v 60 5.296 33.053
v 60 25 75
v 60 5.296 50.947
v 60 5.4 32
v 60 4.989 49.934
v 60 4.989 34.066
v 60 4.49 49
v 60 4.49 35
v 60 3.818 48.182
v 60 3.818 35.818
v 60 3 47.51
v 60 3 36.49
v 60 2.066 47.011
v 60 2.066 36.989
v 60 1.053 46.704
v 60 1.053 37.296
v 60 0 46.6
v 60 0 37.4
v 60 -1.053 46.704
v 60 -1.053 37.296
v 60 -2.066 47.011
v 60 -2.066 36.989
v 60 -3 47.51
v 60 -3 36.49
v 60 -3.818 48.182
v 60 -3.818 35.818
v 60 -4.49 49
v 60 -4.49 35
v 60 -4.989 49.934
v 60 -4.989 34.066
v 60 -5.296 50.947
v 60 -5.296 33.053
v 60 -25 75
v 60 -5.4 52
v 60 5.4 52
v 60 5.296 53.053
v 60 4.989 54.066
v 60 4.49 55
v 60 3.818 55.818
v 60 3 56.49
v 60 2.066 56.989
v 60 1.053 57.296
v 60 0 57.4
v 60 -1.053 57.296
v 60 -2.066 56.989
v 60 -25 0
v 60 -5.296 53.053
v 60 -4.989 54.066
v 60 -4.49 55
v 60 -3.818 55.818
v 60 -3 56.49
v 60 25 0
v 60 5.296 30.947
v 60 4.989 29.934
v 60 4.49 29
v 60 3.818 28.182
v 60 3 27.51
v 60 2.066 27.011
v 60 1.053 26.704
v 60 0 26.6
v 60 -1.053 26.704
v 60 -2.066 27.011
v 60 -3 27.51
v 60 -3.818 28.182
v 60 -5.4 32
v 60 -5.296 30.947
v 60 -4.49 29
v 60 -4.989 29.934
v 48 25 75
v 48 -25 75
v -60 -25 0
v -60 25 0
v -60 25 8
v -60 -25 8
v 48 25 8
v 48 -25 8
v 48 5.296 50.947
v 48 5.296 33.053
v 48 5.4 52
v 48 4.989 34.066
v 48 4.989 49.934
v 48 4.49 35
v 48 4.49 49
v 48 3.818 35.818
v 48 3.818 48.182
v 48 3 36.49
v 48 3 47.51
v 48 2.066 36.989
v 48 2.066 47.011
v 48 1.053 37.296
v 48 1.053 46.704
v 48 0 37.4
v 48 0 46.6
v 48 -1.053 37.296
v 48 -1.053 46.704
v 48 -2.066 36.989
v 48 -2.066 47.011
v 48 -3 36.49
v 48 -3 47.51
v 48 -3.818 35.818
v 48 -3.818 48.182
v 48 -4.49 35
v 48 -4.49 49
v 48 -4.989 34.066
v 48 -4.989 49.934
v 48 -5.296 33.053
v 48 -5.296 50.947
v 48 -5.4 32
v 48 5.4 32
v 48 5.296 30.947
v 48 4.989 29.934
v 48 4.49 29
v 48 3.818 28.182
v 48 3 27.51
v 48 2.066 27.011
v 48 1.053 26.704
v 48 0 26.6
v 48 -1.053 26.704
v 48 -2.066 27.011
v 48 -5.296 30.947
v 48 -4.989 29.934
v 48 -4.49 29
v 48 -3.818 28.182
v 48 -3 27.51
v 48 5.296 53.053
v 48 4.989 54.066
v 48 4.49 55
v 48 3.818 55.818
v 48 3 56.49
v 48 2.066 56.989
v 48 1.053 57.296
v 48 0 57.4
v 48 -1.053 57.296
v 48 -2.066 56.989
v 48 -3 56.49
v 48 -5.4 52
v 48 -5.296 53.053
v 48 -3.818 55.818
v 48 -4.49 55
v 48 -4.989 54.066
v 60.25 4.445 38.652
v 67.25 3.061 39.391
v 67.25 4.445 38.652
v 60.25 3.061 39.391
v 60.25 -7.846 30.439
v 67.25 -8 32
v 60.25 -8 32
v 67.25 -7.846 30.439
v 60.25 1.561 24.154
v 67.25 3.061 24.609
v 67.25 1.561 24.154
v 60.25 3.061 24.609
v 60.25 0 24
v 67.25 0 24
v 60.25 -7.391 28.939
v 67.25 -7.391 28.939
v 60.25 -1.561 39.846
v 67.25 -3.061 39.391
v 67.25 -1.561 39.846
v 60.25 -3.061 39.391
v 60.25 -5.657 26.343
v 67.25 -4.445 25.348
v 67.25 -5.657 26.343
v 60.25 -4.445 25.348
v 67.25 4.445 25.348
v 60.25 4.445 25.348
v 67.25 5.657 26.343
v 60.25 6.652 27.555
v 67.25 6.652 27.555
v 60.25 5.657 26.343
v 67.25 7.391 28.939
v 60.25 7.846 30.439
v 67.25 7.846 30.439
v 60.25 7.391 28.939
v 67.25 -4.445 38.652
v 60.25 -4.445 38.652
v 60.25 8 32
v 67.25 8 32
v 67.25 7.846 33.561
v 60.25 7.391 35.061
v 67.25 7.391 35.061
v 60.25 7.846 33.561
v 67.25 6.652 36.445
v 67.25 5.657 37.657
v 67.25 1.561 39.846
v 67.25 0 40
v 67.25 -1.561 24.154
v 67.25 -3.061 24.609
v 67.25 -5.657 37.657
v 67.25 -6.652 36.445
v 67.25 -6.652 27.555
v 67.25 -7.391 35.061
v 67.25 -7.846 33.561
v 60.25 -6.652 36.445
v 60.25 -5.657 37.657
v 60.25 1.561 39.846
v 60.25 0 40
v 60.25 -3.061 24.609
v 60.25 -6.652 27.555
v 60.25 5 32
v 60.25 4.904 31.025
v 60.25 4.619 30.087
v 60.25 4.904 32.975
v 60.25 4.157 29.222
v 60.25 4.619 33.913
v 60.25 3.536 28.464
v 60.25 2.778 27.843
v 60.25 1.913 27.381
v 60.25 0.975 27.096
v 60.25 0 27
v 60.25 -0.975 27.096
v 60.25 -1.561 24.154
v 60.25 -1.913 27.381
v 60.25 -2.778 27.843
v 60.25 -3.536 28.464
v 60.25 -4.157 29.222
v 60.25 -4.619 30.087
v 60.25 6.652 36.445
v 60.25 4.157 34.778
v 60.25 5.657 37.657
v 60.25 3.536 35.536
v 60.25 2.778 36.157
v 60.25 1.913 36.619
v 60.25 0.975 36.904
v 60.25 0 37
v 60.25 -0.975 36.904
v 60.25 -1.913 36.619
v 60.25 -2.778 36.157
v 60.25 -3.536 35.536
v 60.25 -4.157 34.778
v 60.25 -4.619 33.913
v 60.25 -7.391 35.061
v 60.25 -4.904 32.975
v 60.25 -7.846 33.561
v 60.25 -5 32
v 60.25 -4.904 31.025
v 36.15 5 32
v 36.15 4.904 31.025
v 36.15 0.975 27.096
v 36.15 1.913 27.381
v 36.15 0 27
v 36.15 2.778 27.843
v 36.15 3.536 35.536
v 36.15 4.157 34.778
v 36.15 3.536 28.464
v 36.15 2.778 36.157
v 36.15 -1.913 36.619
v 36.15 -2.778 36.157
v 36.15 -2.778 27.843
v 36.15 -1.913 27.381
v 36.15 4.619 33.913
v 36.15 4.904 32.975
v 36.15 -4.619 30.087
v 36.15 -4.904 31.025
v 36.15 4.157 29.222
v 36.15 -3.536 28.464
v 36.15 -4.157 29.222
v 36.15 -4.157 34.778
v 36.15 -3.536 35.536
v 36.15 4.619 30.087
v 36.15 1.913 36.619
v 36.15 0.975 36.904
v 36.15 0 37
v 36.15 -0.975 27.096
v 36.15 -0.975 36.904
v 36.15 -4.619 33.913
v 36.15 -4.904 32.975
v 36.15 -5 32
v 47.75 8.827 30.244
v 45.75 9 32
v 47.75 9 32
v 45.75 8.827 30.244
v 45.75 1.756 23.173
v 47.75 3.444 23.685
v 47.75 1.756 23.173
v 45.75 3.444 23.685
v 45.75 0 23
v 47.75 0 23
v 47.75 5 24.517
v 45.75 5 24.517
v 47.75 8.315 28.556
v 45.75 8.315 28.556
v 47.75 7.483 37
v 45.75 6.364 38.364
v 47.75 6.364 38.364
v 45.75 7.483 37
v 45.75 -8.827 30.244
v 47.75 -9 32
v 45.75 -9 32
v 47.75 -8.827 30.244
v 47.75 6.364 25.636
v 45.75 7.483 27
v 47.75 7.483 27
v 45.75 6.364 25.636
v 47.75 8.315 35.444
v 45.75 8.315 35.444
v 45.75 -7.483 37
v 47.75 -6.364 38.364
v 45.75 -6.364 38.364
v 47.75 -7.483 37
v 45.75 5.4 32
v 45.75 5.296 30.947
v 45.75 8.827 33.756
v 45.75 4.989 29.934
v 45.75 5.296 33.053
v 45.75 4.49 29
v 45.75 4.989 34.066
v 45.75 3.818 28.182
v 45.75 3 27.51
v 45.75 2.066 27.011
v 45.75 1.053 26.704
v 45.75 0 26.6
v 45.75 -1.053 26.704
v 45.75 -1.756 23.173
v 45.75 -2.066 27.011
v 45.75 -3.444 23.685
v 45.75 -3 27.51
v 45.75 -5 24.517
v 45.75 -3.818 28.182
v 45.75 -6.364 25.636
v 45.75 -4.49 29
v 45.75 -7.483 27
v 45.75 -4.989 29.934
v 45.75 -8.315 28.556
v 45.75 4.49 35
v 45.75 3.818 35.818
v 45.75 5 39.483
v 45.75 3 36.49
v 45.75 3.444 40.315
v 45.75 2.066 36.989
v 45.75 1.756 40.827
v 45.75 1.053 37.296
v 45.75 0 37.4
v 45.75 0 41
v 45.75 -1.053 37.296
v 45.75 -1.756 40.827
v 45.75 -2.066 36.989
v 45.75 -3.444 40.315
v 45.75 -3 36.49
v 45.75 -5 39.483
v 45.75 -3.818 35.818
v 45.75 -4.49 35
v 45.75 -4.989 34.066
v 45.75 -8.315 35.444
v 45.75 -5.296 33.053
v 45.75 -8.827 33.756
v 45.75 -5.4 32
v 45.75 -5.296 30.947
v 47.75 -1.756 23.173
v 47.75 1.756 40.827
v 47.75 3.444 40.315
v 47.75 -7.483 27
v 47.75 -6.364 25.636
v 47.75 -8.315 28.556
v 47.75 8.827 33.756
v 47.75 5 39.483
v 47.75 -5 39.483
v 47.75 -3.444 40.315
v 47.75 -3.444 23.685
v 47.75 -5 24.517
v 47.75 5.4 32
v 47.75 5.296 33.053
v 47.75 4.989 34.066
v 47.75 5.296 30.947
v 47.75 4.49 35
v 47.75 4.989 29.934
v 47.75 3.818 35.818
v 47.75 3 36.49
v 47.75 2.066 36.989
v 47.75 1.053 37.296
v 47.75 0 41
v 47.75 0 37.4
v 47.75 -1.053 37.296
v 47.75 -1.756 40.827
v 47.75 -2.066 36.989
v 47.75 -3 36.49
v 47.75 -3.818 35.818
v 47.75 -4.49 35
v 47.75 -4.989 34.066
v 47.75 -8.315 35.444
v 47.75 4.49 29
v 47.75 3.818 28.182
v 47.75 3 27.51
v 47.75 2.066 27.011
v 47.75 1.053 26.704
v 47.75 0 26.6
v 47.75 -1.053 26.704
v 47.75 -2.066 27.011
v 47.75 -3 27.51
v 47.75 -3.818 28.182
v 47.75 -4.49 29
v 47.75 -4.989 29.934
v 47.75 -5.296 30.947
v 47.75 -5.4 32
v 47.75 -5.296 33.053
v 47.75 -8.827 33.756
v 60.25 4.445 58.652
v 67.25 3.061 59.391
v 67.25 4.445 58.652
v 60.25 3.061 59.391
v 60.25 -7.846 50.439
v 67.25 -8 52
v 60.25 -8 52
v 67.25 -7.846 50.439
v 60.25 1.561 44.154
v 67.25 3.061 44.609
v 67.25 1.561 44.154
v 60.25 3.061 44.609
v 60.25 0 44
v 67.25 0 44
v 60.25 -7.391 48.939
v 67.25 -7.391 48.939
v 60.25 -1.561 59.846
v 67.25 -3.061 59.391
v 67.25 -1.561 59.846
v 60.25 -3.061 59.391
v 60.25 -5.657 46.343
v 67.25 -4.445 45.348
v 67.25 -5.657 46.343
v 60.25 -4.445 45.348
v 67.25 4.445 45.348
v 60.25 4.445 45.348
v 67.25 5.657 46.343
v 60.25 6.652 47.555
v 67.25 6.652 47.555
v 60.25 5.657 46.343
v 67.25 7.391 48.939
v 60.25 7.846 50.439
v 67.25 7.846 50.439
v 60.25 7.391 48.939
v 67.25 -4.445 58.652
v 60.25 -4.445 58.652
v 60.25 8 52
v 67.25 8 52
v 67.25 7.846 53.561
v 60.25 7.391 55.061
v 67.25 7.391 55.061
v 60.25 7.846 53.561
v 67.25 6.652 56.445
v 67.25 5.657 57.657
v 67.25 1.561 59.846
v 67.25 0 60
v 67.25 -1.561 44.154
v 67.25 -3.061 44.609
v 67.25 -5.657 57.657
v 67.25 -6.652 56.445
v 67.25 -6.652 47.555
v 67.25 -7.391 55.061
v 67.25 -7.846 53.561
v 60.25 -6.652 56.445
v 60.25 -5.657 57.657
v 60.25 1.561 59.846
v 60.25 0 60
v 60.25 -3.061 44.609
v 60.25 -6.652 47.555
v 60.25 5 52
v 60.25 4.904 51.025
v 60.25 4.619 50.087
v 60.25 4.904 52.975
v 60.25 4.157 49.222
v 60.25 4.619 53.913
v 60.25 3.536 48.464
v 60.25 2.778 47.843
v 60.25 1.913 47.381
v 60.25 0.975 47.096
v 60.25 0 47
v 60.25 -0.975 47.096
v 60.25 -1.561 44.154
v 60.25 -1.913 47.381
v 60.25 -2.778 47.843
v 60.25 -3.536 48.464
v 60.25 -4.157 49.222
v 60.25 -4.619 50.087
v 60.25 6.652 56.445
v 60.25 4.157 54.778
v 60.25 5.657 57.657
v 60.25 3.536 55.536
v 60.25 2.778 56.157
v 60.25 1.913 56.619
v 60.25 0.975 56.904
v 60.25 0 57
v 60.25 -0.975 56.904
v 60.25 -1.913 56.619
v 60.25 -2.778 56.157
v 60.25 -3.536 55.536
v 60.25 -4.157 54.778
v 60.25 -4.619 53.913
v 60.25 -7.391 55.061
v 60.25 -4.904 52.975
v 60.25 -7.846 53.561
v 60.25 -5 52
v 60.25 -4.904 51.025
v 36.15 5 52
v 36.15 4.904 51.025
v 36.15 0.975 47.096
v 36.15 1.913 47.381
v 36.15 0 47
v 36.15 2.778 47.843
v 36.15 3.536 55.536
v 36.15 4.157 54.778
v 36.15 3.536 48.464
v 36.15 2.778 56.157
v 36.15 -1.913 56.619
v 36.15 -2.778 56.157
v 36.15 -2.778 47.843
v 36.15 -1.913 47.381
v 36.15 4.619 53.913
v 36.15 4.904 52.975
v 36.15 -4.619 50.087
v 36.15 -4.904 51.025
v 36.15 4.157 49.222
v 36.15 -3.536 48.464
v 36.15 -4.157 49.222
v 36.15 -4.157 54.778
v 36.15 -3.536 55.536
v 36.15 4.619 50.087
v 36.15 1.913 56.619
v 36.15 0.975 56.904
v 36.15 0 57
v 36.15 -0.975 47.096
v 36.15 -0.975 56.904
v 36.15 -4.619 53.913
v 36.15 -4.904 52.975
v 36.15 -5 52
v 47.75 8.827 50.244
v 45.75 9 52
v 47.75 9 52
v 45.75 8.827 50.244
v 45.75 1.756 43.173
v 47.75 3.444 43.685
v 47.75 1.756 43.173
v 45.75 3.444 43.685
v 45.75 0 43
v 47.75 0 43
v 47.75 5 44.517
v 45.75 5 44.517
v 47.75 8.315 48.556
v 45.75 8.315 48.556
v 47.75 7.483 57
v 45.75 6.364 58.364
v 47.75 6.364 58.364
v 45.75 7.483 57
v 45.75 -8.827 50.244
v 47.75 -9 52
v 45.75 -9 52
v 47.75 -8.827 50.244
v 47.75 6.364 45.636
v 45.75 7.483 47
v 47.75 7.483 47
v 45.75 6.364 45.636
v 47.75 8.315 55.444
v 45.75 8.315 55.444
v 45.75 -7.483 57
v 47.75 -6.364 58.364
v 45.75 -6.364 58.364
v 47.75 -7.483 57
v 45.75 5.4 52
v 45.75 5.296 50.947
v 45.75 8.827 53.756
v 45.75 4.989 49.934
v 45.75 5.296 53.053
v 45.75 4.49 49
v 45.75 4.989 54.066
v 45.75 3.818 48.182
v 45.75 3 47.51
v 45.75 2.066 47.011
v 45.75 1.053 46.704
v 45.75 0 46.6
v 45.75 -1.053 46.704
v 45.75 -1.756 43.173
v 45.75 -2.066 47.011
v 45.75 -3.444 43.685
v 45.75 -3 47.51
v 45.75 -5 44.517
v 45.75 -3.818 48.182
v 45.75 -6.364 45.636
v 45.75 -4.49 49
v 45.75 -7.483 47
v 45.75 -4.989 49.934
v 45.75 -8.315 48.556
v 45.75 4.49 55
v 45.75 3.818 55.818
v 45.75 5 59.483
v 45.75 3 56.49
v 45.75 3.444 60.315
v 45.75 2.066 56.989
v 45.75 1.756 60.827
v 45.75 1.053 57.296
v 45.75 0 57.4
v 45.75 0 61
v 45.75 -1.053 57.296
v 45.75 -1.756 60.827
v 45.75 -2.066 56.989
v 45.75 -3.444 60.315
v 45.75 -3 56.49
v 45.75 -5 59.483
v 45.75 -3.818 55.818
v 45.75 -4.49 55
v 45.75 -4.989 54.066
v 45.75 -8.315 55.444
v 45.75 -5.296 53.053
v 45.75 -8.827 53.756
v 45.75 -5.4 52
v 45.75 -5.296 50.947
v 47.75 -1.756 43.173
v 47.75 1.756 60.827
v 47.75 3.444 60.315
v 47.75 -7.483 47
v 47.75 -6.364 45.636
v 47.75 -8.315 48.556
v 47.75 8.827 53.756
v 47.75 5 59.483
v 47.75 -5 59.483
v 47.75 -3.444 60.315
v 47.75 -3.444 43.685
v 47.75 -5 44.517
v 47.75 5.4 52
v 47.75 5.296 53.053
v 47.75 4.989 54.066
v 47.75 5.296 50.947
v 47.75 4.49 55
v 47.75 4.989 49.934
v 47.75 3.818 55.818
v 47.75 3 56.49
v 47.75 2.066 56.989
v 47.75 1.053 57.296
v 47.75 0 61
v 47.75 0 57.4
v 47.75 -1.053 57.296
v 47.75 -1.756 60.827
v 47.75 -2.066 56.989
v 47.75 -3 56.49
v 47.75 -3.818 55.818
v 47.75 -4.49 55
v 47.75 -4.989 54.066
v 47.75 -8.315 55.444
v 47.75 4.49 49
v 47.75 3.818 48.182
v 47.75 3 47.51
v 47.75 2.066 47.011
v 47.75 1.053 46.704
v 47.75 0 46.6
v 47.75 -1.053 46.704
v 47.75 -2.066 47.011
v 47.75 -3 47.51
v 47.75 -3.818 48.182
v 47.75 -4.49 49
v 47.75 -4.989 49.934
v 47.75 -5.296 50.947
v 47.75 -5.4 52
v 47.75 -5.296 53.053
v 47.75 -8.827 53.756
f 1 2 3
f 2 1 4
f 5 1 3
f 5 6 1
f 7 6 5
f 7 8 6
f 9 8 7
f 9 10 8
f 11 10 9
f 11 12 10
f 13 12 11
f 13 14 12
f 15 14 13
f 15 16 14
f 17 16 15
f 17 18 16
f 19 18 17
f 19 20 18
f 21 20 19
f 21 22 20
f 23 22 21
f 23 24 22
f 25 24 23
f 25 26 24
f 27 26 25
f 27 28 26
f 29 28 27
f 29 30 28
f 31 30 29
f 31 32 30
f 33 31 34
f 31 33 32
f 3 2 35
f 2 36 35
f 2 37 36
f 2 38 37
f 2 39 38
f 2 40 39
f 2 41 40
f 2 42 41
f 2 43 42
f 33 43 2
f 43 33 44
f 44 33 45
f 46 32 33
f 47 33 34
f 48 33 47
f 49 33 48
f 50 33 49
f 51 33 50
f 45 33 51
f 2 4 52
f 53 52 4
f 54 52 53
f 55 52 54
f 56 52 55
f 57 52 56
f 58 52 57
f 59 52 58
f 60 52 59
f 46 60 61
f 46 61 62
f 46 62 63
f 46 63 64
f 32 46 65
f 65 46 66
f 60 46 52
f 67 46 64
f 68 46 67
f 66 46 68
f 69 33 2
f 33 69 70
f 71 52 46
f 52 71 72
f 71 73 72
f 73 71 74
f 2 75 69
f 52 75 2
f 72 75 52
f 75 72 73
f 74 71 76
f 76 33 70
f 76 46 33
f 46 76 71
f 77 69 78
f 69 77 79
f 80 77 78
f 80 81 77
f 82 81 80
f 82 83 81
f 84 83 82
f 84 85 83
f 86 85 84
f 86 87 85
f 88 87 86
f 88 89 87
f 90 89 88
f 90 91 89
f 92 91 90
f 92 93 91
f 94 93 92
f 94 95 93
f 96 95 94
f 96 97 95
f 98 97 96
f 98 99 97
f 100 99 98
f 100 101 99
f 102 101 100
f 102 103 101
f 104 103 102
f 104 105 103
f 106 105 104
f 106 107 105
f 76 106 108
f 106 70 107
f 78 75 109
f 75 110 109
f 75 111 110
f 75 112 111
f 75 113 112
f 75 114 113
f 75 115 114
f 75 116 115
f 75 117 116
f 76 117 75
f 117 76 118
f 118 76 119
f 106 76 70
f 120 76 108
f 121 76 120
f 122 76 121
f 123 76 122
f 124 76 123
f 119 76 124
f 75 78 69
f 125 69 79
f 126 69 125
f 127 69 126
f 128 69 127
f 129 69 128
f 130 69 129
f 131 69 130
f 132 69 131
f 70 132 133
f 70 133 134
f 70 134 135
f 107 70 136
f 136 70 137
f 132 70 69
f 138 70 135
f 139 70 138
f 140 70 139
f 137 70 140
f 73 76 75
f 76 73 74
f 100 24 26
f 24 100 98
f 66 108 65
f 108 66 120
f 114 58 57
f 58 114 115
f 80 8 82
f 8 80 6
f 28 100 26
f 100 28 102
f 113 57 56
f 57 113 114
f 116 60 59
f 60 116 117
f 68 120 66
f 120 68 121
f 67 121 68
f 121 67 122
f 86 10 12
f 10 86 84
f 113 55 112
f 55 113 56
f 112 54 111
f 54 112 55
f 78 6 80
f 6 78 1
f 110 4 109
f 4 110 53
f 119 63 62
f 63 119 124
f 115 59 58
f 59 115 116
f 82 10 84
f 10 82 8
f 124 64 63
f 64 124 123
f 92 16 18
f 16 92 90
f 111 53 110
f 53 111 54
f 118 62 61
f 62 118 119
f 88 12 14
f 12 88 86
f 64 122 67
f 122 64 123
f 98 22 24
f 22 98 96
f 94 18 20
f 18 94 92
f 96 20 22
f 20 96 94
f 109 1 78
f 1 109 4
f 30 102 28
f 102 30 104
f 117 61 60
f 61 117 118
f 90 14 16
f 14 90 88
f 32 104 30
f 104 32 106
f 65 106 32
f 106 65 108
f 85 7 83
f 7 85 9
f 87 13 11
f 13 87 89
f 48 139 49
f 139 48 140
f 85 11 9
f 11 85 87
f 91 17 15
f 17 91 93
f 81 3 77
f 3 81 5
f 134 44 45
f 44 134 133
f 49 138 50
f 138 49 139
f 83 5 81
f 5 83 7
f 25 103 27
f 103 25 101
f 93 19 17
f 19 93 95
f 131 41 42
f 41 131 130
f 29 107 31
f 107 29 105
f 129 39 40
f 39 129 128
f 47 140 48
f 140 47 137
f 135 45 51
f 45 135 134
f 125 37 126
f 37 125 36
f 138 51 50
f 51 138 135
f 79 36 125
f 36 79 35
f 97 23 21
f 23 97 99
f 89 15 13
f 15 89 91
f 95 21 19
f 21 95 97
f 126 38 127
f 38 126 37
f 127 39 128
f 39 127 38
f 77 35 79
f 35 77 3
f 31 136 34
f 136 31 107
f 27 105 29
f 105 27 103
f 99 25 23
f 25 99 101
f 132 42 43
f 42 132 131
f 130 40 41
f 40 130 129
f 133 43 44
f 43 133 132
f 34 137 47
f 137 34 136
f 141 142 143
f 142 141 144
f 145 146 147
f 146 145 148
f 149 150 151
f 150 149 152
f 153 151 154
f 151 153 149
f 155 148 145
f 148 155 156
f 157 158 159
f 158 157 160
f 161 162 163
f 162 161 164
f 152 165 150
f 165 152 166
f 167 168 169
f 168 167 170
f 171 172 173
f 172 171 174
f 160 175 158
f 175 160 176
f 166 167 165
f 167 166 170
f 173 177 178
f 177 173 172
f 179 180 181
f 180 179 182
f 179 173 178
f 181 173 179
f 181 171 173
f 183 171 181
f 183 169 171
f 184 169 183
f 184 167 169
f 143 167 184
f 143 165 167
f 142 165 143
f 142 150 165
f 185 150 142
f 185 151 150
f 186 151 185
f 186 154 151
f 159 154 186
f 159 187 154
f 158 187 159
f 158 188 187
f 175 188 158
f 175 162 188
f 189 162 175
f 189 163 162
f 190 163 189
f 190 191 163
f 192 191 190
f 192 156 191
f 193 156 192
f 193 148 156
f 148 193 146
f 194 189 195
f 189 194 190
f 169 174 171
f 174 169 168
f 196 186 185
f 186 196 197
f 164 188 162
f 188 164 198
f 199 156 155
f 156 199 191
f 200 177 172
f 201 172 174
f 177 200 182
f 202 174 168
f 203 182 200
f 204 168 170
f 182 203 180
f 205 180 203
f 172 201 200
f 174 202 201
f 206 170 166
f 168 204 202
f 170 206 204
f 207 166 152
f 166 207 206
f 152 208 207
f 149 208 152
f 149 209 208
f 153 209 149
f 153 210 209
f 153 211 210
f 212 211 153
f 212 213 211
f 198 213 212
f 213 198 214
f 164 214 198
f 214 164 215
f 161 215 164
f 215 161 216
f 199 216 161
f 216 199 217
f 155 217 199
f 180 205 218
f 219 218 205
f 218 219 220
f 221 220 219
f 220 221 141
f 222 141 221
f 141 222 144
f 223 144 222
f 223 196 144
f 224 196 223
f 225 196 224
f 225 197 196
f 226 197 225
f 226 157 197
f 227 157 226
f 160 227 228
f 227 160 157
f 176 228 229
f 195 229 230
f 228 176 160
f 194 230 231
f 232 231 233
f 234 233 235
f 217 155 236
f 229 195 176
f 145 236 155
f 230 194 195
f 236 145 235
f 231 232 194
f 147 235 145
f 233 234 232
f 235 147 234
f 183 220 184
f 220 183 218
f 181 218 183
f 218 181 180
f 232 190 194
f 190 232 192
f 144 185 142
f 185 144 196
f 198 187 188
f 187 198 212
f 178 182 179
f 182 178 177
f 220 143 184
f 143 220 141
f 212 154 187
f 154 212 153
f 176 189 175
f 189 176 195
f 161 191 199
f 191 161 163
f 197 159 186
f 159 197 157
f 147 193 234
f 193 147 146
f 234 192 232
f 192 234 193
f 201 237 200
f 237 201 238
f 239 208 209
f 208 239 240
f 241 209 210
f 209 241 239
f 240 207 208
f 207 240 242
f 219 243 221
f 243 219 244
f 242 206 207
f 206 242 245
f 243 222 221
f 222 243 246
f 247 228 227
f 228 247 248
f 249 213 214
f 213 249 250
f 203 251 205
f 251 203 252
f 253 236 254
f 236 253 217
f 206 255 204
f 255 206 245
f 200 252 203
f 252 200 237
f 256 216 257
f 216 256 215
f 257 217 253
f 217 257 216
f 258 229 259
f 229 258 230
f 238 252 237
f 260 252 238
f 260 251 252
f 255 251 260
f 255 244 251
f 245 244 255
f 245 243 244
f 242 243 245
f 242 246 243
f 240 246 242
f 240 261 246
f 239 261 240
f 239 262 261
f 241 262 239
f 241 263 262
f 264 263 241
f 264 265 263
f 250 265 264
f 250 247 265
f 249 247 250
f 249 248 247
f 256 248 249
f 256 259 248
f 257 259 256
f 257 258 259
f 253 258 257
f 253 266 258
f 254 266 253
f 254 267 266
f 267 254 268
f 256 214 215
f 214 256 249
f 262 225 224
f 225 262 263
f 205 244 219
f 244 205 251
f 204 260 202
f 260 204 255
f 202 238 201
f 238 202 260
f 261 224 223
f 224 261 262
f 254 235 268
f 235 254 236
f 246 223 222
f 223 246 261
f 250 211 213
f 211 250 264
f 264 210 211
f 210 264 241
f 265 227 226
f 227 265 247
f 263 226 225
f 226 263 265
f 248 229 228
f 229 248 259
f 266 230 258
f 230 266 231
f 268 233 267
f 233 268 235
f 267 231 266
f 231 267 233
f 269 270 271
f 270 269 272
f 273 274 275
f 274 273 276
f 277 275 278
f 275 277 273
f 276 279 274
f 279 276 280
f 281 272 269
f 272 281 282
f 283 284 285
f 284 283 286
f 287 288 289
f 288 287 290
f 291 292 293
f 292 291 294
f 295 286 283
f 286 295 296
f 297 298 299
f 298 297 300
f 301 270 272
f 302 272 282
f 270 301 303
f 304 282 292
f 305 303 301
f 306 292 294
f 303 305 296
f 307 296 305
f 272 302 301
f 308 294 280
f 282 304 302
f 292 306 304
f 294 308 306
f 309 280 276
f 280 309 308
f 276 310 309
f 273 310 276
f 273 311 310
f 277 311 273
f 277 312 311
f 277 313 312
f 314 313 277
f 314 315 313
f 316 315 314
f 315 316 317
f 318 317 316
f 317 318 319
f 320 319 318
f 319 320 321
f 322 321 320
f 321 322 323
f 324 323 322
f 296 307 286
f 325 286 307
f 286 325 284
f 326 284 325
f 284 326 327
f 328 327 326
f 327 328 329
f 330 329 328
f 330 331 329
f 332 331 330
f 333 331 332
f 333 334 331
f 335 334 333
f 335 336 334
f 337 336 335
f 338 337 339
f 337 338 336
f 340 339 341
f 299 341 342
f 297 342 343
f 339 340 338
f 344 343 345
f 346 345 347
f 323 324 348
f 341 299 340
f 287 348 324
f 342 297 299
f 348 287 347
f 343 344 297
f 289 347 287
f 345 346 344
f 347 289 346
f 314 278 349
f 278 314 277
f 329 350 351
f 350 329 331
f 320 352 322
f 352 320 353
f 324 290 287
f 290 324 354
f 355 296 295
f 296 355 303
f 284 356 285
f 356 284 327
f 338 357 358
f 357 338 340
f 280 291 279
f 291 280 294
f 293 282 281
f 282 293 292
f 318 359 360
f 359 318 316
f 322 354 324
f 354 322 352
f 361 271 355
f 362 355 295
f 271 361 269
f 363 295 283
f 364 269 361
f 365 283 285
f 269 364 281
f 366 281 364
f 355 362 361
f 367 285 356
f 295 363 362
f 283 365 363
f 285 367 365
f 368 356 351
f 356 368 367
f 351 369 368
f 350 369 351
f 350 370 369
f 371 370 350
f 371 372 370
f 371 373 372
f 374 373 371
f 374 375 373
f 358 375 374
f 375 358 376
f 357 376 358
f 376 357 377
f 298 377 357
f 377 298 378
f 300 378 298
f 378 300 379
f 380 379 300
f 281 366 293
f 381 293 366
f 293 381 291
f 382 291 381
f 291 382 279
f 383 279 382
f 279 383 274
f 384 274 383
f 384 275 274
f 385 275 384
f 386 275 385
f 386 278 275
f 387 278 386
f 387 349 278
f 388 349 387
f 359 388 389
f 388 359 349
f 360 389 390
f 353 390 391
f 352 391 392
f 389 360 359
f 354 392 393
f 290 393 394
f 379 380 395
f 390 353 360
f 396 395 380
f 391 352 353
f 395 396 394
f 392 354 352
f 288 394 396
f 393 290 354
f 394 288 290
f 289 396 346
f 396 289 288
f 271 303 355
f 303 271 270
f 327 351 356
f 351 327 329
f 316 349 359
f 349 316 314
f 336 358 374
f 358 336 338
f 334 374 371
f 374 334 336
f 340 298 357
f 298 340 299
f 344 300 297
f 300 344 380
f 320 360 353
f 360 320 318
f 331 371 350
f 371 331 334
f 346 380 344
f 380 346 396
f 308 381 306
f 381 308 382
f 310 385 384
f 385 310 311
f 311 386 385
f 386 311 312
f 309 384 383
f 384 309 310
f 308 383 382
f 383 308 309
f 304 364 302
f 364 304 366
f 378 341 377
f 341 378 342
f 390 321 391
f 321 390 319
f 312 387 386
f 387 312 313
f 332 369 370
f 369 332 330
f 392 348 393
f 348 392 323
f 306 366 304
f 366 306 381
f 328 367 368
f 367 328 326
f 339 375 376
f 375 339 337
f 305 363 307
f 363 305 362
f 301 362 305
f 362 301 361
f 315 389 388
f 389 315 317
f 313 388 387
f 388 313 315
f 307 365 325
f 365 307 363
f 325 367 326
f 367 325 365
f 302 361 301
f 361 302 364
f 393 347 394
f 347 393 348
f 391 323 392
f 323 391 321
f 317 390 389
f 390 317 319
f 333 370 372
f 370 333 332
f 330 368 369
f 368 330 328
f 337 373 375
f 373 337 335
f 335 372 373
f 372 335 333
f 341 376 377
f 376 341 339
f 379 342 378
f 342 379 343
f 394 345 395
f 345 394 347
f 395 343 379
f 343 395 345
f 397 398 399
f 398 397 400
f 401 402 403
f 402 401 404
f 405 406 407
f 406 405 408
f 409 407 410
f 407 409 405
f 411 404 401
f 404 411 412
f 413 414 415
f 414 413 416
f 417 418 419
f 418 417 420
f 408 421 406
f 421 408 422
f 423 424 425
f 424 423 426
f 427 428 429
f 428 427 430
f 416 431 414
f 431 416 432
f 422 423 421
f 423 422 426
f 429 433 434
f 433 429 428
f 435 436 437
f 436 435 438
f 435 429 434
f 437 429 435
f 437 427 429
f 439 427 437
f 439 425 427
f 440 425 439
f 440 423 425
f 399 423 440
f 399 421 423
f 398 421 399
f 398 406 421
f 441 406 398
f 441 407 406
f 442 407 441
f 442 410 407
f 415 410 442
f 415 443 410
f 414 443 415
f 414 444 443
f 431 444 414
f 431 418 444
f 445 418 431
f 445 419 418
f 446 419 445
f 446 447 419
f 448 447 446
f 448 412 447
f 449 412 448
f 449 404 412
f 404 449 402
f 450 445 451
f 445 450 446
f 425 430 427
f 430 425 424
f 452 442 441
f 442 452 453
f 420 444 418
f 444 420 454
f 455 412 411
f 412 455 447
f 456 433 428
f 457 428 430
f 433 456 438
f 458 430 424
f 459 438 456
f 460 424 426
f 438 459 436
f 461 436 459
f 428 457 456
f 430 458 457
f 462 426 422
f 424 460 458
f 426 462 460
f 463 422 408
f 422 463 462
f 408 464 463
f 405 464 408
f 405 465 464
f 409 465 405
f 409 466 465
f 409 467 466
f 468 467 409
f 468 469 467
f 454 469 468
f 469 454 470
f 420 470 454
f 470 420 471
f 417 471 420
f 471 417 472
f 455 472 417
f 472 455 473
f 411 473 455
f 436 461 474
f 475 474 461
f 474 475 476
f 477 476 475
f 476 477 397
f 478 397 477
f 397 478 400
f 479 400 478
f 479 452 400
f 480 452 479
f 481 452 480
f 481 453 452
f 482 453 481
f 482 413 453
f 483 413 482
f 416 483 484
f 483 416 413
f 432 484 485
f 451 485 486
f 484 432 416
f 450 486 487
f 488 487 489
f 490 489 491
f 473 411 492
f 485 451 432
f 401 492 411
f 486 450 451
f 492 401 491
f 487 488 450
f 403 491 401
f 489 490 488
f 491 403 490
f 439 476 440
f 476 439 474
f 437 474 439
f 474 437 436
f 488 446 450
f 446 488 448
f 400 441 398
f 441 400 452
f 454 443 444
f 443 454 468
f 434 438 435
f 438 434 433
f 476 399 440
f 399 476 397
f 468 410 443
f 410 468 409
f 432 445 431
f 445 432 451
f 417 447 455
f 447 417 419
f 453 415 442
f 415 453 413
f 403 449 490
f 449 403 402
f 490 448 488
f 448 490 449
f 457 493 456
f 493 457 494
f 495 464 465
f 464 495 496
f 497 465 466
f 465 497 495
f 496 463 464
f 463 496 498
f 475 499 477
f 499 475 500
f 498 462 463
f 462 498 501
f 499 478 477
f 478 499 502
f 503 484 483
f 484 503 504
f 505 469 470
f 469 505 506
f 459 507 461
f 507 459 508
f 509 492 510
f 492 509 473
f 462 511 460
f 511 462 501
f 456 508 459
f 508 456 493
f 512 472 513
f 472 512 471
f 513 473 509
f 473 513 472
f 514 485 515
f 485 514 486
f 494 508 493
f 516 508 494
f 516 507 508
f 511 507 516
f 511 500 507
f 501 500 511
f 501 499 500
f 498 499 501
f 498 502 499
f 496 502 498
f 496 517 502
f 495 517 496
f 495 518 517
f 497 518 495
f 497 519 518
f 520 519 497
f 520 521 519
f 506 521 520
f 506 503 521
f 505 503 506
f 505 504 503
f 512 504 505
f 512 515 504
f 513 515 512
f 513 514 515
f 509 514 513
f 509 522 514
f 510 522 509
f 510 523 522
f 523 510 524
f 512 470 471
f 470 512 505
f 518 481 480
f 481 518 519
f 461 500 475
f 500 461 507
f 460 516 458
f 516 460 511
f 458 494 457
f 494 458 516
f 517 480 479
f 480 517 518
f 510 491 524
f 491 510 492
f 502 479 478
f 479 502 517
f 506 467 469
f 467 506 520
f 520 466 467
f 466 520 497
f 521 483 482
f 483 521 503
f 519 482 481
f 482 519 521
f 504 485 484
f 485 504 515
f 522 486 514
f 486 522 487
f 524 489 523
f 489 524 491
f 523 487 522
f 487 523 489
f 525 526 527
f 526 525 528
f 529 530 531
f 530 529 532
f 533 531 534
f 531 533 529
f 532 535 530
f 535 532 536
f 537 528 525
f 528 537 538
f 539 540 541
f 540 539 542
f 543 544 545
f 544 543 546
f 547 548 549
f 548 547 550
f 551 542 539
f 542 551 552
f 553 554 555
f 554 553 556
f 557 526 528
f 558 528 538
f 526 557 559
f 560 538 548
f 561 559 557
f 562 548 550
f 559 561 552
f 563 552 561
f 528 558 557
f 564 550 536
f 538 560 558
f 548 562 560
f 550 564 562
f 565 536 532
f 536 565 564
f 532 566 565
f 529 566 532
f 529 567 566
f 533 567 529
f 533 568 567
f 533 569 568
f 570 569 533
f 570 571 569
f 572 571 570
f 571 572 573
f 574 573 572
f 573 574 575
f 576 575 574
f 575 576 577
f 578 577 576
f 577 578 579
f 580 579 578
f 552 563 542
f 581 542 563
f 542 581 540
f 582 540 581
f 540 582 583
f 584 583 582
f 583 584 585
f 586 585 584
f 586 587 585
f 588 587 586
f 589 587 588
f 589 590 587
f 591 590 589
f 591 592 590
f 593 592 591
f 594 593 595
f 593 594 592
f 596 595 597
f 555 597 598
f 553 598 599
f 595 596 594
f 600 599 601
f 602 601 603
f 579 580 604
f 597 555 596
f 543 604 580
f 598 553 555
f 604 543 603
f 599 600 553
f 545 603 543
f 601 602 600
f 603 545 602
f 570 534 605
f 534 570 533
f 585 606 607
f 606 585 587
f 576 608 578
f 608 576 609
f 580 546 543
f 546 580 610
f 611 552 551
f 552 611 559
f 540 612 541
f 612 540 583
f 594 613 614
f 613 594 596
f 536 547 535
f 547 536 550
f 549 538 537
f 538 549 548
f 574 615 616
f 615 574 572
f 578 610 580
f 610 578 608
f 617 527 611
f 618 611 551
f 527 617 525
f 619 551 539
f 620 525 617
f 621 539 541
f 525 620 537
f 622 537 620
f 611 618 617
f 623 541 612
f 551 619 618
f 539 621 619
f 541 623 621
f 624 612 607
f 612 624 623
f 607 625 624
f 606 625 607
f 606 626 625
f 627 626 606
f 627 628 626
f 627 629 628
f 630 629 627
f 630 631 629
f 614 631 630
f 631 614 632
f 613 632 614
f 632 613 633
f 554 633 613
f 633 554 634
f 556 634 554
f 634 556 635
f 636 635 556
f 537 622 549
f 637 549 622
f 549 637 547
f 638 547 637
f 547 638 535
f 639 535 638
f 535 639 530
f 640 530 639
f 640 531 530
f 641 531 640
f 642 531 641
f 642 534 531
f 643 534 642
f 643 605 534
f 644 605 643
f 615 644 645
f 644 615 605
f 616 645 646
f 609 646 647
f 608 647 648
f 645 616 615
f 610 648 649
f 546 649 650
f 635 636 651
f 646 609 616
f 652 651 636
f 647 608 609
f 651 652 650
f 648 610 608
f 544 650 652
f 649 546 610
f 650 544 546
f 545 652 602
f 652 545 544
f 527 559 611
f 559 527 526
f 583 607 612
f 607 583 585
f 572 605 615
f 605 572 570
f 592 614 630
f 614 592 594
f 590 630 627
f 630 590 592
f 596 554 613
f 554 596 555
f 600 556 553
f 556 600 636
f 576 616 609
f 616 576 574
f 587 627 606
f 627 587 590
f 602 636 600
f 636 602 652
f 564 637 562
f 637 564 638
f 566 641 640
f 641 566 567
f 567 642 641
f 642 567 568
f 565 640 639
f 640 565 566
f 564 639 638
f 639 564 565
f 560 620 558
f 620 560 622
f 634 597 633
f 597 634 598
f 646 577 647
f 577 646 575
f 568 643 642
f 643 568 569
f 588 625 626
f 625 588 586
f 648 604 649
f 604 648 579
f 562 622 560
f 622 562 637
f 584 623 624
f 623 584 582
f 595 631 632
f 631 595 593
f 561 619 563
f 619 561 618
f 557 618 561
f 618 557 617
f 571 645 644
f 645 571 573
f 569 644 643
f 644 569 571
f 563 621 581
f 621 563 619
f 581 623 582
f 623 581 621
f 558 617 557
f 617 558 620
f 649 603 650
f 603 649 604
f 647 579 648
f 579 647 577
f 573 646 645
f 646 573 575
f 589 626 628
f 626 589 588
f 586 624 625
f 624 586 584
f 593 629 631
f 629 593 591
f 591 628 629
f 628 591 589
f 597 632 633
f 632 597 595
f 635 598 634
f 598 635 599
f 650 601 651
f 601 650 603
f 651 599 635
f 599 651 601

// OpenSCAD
$fn = 32;

// ------------------------------------------------------------------------
// Bolted bracket: 120 x 50 mm bracket with 2 bolt joints
// Every part is its own module, assembly() places them once.
// ------------------------------------------------------------------------

// --- part 1 ---
module bracket() {
  difference() {
    translate([-60, -25, 0]) cube([120, 50, 75]);
    translate([-61, -26, 8]) cube([109, 52, 68]);
    translate([54, 0, 32]) rotate([0, 90, 0]) cylinder(h = 14, d = 10.8, center = true);
    translate([54, 0, 52]) rotate([0, 90, 0]) cylinder(h = 14, d = 10.8, center = true);
  }
}

// --- part 2 ---
module bolt1() {
  cylinder(h = 7, d = 16);
  translate([0, 0, -24.1]) cylinder(h = 24.1, d = 10);
}

// --- part 3 ---
module washer1() {
  difference() {
      translate([0, 0, 0]) cylinder(h = 2, d = 18);
      translate([0, 0, -1]) cylinder(h = 4, d = 10.8);
    }
}

// --- part 4 ---
module bolt2() {
  cylinder(h = 7, d = 16);
  translate([0, 0, -24.1]) cylinder(h = 24.1, d = 10);
}

// --- part 5 ---
module washer2() {
  difference() {
      translate([0, 0, 0]) cylinder(h = 2, d = 18);
      translate([0, 0, -1]) cylinder(h = 4, d = 10.8);
    }
}

// --- assembly ---
module assembly() {
  translate([0, 0, 0]) rotate([0, 0, 0]) bracket();
  translate([60.25, 0, 32]) rotate([0, 90, 0]) bolt1();
  translate([45.75, 0, 32]) rotate([0, 90, 0]) washer1();
  translate([60.25, 0, 52]) rotate([0, 90, 0]) bolt2();
  translate([45.75, 0, 52]) rotate([0, 90, 0]) washer2();
}

assembly();
